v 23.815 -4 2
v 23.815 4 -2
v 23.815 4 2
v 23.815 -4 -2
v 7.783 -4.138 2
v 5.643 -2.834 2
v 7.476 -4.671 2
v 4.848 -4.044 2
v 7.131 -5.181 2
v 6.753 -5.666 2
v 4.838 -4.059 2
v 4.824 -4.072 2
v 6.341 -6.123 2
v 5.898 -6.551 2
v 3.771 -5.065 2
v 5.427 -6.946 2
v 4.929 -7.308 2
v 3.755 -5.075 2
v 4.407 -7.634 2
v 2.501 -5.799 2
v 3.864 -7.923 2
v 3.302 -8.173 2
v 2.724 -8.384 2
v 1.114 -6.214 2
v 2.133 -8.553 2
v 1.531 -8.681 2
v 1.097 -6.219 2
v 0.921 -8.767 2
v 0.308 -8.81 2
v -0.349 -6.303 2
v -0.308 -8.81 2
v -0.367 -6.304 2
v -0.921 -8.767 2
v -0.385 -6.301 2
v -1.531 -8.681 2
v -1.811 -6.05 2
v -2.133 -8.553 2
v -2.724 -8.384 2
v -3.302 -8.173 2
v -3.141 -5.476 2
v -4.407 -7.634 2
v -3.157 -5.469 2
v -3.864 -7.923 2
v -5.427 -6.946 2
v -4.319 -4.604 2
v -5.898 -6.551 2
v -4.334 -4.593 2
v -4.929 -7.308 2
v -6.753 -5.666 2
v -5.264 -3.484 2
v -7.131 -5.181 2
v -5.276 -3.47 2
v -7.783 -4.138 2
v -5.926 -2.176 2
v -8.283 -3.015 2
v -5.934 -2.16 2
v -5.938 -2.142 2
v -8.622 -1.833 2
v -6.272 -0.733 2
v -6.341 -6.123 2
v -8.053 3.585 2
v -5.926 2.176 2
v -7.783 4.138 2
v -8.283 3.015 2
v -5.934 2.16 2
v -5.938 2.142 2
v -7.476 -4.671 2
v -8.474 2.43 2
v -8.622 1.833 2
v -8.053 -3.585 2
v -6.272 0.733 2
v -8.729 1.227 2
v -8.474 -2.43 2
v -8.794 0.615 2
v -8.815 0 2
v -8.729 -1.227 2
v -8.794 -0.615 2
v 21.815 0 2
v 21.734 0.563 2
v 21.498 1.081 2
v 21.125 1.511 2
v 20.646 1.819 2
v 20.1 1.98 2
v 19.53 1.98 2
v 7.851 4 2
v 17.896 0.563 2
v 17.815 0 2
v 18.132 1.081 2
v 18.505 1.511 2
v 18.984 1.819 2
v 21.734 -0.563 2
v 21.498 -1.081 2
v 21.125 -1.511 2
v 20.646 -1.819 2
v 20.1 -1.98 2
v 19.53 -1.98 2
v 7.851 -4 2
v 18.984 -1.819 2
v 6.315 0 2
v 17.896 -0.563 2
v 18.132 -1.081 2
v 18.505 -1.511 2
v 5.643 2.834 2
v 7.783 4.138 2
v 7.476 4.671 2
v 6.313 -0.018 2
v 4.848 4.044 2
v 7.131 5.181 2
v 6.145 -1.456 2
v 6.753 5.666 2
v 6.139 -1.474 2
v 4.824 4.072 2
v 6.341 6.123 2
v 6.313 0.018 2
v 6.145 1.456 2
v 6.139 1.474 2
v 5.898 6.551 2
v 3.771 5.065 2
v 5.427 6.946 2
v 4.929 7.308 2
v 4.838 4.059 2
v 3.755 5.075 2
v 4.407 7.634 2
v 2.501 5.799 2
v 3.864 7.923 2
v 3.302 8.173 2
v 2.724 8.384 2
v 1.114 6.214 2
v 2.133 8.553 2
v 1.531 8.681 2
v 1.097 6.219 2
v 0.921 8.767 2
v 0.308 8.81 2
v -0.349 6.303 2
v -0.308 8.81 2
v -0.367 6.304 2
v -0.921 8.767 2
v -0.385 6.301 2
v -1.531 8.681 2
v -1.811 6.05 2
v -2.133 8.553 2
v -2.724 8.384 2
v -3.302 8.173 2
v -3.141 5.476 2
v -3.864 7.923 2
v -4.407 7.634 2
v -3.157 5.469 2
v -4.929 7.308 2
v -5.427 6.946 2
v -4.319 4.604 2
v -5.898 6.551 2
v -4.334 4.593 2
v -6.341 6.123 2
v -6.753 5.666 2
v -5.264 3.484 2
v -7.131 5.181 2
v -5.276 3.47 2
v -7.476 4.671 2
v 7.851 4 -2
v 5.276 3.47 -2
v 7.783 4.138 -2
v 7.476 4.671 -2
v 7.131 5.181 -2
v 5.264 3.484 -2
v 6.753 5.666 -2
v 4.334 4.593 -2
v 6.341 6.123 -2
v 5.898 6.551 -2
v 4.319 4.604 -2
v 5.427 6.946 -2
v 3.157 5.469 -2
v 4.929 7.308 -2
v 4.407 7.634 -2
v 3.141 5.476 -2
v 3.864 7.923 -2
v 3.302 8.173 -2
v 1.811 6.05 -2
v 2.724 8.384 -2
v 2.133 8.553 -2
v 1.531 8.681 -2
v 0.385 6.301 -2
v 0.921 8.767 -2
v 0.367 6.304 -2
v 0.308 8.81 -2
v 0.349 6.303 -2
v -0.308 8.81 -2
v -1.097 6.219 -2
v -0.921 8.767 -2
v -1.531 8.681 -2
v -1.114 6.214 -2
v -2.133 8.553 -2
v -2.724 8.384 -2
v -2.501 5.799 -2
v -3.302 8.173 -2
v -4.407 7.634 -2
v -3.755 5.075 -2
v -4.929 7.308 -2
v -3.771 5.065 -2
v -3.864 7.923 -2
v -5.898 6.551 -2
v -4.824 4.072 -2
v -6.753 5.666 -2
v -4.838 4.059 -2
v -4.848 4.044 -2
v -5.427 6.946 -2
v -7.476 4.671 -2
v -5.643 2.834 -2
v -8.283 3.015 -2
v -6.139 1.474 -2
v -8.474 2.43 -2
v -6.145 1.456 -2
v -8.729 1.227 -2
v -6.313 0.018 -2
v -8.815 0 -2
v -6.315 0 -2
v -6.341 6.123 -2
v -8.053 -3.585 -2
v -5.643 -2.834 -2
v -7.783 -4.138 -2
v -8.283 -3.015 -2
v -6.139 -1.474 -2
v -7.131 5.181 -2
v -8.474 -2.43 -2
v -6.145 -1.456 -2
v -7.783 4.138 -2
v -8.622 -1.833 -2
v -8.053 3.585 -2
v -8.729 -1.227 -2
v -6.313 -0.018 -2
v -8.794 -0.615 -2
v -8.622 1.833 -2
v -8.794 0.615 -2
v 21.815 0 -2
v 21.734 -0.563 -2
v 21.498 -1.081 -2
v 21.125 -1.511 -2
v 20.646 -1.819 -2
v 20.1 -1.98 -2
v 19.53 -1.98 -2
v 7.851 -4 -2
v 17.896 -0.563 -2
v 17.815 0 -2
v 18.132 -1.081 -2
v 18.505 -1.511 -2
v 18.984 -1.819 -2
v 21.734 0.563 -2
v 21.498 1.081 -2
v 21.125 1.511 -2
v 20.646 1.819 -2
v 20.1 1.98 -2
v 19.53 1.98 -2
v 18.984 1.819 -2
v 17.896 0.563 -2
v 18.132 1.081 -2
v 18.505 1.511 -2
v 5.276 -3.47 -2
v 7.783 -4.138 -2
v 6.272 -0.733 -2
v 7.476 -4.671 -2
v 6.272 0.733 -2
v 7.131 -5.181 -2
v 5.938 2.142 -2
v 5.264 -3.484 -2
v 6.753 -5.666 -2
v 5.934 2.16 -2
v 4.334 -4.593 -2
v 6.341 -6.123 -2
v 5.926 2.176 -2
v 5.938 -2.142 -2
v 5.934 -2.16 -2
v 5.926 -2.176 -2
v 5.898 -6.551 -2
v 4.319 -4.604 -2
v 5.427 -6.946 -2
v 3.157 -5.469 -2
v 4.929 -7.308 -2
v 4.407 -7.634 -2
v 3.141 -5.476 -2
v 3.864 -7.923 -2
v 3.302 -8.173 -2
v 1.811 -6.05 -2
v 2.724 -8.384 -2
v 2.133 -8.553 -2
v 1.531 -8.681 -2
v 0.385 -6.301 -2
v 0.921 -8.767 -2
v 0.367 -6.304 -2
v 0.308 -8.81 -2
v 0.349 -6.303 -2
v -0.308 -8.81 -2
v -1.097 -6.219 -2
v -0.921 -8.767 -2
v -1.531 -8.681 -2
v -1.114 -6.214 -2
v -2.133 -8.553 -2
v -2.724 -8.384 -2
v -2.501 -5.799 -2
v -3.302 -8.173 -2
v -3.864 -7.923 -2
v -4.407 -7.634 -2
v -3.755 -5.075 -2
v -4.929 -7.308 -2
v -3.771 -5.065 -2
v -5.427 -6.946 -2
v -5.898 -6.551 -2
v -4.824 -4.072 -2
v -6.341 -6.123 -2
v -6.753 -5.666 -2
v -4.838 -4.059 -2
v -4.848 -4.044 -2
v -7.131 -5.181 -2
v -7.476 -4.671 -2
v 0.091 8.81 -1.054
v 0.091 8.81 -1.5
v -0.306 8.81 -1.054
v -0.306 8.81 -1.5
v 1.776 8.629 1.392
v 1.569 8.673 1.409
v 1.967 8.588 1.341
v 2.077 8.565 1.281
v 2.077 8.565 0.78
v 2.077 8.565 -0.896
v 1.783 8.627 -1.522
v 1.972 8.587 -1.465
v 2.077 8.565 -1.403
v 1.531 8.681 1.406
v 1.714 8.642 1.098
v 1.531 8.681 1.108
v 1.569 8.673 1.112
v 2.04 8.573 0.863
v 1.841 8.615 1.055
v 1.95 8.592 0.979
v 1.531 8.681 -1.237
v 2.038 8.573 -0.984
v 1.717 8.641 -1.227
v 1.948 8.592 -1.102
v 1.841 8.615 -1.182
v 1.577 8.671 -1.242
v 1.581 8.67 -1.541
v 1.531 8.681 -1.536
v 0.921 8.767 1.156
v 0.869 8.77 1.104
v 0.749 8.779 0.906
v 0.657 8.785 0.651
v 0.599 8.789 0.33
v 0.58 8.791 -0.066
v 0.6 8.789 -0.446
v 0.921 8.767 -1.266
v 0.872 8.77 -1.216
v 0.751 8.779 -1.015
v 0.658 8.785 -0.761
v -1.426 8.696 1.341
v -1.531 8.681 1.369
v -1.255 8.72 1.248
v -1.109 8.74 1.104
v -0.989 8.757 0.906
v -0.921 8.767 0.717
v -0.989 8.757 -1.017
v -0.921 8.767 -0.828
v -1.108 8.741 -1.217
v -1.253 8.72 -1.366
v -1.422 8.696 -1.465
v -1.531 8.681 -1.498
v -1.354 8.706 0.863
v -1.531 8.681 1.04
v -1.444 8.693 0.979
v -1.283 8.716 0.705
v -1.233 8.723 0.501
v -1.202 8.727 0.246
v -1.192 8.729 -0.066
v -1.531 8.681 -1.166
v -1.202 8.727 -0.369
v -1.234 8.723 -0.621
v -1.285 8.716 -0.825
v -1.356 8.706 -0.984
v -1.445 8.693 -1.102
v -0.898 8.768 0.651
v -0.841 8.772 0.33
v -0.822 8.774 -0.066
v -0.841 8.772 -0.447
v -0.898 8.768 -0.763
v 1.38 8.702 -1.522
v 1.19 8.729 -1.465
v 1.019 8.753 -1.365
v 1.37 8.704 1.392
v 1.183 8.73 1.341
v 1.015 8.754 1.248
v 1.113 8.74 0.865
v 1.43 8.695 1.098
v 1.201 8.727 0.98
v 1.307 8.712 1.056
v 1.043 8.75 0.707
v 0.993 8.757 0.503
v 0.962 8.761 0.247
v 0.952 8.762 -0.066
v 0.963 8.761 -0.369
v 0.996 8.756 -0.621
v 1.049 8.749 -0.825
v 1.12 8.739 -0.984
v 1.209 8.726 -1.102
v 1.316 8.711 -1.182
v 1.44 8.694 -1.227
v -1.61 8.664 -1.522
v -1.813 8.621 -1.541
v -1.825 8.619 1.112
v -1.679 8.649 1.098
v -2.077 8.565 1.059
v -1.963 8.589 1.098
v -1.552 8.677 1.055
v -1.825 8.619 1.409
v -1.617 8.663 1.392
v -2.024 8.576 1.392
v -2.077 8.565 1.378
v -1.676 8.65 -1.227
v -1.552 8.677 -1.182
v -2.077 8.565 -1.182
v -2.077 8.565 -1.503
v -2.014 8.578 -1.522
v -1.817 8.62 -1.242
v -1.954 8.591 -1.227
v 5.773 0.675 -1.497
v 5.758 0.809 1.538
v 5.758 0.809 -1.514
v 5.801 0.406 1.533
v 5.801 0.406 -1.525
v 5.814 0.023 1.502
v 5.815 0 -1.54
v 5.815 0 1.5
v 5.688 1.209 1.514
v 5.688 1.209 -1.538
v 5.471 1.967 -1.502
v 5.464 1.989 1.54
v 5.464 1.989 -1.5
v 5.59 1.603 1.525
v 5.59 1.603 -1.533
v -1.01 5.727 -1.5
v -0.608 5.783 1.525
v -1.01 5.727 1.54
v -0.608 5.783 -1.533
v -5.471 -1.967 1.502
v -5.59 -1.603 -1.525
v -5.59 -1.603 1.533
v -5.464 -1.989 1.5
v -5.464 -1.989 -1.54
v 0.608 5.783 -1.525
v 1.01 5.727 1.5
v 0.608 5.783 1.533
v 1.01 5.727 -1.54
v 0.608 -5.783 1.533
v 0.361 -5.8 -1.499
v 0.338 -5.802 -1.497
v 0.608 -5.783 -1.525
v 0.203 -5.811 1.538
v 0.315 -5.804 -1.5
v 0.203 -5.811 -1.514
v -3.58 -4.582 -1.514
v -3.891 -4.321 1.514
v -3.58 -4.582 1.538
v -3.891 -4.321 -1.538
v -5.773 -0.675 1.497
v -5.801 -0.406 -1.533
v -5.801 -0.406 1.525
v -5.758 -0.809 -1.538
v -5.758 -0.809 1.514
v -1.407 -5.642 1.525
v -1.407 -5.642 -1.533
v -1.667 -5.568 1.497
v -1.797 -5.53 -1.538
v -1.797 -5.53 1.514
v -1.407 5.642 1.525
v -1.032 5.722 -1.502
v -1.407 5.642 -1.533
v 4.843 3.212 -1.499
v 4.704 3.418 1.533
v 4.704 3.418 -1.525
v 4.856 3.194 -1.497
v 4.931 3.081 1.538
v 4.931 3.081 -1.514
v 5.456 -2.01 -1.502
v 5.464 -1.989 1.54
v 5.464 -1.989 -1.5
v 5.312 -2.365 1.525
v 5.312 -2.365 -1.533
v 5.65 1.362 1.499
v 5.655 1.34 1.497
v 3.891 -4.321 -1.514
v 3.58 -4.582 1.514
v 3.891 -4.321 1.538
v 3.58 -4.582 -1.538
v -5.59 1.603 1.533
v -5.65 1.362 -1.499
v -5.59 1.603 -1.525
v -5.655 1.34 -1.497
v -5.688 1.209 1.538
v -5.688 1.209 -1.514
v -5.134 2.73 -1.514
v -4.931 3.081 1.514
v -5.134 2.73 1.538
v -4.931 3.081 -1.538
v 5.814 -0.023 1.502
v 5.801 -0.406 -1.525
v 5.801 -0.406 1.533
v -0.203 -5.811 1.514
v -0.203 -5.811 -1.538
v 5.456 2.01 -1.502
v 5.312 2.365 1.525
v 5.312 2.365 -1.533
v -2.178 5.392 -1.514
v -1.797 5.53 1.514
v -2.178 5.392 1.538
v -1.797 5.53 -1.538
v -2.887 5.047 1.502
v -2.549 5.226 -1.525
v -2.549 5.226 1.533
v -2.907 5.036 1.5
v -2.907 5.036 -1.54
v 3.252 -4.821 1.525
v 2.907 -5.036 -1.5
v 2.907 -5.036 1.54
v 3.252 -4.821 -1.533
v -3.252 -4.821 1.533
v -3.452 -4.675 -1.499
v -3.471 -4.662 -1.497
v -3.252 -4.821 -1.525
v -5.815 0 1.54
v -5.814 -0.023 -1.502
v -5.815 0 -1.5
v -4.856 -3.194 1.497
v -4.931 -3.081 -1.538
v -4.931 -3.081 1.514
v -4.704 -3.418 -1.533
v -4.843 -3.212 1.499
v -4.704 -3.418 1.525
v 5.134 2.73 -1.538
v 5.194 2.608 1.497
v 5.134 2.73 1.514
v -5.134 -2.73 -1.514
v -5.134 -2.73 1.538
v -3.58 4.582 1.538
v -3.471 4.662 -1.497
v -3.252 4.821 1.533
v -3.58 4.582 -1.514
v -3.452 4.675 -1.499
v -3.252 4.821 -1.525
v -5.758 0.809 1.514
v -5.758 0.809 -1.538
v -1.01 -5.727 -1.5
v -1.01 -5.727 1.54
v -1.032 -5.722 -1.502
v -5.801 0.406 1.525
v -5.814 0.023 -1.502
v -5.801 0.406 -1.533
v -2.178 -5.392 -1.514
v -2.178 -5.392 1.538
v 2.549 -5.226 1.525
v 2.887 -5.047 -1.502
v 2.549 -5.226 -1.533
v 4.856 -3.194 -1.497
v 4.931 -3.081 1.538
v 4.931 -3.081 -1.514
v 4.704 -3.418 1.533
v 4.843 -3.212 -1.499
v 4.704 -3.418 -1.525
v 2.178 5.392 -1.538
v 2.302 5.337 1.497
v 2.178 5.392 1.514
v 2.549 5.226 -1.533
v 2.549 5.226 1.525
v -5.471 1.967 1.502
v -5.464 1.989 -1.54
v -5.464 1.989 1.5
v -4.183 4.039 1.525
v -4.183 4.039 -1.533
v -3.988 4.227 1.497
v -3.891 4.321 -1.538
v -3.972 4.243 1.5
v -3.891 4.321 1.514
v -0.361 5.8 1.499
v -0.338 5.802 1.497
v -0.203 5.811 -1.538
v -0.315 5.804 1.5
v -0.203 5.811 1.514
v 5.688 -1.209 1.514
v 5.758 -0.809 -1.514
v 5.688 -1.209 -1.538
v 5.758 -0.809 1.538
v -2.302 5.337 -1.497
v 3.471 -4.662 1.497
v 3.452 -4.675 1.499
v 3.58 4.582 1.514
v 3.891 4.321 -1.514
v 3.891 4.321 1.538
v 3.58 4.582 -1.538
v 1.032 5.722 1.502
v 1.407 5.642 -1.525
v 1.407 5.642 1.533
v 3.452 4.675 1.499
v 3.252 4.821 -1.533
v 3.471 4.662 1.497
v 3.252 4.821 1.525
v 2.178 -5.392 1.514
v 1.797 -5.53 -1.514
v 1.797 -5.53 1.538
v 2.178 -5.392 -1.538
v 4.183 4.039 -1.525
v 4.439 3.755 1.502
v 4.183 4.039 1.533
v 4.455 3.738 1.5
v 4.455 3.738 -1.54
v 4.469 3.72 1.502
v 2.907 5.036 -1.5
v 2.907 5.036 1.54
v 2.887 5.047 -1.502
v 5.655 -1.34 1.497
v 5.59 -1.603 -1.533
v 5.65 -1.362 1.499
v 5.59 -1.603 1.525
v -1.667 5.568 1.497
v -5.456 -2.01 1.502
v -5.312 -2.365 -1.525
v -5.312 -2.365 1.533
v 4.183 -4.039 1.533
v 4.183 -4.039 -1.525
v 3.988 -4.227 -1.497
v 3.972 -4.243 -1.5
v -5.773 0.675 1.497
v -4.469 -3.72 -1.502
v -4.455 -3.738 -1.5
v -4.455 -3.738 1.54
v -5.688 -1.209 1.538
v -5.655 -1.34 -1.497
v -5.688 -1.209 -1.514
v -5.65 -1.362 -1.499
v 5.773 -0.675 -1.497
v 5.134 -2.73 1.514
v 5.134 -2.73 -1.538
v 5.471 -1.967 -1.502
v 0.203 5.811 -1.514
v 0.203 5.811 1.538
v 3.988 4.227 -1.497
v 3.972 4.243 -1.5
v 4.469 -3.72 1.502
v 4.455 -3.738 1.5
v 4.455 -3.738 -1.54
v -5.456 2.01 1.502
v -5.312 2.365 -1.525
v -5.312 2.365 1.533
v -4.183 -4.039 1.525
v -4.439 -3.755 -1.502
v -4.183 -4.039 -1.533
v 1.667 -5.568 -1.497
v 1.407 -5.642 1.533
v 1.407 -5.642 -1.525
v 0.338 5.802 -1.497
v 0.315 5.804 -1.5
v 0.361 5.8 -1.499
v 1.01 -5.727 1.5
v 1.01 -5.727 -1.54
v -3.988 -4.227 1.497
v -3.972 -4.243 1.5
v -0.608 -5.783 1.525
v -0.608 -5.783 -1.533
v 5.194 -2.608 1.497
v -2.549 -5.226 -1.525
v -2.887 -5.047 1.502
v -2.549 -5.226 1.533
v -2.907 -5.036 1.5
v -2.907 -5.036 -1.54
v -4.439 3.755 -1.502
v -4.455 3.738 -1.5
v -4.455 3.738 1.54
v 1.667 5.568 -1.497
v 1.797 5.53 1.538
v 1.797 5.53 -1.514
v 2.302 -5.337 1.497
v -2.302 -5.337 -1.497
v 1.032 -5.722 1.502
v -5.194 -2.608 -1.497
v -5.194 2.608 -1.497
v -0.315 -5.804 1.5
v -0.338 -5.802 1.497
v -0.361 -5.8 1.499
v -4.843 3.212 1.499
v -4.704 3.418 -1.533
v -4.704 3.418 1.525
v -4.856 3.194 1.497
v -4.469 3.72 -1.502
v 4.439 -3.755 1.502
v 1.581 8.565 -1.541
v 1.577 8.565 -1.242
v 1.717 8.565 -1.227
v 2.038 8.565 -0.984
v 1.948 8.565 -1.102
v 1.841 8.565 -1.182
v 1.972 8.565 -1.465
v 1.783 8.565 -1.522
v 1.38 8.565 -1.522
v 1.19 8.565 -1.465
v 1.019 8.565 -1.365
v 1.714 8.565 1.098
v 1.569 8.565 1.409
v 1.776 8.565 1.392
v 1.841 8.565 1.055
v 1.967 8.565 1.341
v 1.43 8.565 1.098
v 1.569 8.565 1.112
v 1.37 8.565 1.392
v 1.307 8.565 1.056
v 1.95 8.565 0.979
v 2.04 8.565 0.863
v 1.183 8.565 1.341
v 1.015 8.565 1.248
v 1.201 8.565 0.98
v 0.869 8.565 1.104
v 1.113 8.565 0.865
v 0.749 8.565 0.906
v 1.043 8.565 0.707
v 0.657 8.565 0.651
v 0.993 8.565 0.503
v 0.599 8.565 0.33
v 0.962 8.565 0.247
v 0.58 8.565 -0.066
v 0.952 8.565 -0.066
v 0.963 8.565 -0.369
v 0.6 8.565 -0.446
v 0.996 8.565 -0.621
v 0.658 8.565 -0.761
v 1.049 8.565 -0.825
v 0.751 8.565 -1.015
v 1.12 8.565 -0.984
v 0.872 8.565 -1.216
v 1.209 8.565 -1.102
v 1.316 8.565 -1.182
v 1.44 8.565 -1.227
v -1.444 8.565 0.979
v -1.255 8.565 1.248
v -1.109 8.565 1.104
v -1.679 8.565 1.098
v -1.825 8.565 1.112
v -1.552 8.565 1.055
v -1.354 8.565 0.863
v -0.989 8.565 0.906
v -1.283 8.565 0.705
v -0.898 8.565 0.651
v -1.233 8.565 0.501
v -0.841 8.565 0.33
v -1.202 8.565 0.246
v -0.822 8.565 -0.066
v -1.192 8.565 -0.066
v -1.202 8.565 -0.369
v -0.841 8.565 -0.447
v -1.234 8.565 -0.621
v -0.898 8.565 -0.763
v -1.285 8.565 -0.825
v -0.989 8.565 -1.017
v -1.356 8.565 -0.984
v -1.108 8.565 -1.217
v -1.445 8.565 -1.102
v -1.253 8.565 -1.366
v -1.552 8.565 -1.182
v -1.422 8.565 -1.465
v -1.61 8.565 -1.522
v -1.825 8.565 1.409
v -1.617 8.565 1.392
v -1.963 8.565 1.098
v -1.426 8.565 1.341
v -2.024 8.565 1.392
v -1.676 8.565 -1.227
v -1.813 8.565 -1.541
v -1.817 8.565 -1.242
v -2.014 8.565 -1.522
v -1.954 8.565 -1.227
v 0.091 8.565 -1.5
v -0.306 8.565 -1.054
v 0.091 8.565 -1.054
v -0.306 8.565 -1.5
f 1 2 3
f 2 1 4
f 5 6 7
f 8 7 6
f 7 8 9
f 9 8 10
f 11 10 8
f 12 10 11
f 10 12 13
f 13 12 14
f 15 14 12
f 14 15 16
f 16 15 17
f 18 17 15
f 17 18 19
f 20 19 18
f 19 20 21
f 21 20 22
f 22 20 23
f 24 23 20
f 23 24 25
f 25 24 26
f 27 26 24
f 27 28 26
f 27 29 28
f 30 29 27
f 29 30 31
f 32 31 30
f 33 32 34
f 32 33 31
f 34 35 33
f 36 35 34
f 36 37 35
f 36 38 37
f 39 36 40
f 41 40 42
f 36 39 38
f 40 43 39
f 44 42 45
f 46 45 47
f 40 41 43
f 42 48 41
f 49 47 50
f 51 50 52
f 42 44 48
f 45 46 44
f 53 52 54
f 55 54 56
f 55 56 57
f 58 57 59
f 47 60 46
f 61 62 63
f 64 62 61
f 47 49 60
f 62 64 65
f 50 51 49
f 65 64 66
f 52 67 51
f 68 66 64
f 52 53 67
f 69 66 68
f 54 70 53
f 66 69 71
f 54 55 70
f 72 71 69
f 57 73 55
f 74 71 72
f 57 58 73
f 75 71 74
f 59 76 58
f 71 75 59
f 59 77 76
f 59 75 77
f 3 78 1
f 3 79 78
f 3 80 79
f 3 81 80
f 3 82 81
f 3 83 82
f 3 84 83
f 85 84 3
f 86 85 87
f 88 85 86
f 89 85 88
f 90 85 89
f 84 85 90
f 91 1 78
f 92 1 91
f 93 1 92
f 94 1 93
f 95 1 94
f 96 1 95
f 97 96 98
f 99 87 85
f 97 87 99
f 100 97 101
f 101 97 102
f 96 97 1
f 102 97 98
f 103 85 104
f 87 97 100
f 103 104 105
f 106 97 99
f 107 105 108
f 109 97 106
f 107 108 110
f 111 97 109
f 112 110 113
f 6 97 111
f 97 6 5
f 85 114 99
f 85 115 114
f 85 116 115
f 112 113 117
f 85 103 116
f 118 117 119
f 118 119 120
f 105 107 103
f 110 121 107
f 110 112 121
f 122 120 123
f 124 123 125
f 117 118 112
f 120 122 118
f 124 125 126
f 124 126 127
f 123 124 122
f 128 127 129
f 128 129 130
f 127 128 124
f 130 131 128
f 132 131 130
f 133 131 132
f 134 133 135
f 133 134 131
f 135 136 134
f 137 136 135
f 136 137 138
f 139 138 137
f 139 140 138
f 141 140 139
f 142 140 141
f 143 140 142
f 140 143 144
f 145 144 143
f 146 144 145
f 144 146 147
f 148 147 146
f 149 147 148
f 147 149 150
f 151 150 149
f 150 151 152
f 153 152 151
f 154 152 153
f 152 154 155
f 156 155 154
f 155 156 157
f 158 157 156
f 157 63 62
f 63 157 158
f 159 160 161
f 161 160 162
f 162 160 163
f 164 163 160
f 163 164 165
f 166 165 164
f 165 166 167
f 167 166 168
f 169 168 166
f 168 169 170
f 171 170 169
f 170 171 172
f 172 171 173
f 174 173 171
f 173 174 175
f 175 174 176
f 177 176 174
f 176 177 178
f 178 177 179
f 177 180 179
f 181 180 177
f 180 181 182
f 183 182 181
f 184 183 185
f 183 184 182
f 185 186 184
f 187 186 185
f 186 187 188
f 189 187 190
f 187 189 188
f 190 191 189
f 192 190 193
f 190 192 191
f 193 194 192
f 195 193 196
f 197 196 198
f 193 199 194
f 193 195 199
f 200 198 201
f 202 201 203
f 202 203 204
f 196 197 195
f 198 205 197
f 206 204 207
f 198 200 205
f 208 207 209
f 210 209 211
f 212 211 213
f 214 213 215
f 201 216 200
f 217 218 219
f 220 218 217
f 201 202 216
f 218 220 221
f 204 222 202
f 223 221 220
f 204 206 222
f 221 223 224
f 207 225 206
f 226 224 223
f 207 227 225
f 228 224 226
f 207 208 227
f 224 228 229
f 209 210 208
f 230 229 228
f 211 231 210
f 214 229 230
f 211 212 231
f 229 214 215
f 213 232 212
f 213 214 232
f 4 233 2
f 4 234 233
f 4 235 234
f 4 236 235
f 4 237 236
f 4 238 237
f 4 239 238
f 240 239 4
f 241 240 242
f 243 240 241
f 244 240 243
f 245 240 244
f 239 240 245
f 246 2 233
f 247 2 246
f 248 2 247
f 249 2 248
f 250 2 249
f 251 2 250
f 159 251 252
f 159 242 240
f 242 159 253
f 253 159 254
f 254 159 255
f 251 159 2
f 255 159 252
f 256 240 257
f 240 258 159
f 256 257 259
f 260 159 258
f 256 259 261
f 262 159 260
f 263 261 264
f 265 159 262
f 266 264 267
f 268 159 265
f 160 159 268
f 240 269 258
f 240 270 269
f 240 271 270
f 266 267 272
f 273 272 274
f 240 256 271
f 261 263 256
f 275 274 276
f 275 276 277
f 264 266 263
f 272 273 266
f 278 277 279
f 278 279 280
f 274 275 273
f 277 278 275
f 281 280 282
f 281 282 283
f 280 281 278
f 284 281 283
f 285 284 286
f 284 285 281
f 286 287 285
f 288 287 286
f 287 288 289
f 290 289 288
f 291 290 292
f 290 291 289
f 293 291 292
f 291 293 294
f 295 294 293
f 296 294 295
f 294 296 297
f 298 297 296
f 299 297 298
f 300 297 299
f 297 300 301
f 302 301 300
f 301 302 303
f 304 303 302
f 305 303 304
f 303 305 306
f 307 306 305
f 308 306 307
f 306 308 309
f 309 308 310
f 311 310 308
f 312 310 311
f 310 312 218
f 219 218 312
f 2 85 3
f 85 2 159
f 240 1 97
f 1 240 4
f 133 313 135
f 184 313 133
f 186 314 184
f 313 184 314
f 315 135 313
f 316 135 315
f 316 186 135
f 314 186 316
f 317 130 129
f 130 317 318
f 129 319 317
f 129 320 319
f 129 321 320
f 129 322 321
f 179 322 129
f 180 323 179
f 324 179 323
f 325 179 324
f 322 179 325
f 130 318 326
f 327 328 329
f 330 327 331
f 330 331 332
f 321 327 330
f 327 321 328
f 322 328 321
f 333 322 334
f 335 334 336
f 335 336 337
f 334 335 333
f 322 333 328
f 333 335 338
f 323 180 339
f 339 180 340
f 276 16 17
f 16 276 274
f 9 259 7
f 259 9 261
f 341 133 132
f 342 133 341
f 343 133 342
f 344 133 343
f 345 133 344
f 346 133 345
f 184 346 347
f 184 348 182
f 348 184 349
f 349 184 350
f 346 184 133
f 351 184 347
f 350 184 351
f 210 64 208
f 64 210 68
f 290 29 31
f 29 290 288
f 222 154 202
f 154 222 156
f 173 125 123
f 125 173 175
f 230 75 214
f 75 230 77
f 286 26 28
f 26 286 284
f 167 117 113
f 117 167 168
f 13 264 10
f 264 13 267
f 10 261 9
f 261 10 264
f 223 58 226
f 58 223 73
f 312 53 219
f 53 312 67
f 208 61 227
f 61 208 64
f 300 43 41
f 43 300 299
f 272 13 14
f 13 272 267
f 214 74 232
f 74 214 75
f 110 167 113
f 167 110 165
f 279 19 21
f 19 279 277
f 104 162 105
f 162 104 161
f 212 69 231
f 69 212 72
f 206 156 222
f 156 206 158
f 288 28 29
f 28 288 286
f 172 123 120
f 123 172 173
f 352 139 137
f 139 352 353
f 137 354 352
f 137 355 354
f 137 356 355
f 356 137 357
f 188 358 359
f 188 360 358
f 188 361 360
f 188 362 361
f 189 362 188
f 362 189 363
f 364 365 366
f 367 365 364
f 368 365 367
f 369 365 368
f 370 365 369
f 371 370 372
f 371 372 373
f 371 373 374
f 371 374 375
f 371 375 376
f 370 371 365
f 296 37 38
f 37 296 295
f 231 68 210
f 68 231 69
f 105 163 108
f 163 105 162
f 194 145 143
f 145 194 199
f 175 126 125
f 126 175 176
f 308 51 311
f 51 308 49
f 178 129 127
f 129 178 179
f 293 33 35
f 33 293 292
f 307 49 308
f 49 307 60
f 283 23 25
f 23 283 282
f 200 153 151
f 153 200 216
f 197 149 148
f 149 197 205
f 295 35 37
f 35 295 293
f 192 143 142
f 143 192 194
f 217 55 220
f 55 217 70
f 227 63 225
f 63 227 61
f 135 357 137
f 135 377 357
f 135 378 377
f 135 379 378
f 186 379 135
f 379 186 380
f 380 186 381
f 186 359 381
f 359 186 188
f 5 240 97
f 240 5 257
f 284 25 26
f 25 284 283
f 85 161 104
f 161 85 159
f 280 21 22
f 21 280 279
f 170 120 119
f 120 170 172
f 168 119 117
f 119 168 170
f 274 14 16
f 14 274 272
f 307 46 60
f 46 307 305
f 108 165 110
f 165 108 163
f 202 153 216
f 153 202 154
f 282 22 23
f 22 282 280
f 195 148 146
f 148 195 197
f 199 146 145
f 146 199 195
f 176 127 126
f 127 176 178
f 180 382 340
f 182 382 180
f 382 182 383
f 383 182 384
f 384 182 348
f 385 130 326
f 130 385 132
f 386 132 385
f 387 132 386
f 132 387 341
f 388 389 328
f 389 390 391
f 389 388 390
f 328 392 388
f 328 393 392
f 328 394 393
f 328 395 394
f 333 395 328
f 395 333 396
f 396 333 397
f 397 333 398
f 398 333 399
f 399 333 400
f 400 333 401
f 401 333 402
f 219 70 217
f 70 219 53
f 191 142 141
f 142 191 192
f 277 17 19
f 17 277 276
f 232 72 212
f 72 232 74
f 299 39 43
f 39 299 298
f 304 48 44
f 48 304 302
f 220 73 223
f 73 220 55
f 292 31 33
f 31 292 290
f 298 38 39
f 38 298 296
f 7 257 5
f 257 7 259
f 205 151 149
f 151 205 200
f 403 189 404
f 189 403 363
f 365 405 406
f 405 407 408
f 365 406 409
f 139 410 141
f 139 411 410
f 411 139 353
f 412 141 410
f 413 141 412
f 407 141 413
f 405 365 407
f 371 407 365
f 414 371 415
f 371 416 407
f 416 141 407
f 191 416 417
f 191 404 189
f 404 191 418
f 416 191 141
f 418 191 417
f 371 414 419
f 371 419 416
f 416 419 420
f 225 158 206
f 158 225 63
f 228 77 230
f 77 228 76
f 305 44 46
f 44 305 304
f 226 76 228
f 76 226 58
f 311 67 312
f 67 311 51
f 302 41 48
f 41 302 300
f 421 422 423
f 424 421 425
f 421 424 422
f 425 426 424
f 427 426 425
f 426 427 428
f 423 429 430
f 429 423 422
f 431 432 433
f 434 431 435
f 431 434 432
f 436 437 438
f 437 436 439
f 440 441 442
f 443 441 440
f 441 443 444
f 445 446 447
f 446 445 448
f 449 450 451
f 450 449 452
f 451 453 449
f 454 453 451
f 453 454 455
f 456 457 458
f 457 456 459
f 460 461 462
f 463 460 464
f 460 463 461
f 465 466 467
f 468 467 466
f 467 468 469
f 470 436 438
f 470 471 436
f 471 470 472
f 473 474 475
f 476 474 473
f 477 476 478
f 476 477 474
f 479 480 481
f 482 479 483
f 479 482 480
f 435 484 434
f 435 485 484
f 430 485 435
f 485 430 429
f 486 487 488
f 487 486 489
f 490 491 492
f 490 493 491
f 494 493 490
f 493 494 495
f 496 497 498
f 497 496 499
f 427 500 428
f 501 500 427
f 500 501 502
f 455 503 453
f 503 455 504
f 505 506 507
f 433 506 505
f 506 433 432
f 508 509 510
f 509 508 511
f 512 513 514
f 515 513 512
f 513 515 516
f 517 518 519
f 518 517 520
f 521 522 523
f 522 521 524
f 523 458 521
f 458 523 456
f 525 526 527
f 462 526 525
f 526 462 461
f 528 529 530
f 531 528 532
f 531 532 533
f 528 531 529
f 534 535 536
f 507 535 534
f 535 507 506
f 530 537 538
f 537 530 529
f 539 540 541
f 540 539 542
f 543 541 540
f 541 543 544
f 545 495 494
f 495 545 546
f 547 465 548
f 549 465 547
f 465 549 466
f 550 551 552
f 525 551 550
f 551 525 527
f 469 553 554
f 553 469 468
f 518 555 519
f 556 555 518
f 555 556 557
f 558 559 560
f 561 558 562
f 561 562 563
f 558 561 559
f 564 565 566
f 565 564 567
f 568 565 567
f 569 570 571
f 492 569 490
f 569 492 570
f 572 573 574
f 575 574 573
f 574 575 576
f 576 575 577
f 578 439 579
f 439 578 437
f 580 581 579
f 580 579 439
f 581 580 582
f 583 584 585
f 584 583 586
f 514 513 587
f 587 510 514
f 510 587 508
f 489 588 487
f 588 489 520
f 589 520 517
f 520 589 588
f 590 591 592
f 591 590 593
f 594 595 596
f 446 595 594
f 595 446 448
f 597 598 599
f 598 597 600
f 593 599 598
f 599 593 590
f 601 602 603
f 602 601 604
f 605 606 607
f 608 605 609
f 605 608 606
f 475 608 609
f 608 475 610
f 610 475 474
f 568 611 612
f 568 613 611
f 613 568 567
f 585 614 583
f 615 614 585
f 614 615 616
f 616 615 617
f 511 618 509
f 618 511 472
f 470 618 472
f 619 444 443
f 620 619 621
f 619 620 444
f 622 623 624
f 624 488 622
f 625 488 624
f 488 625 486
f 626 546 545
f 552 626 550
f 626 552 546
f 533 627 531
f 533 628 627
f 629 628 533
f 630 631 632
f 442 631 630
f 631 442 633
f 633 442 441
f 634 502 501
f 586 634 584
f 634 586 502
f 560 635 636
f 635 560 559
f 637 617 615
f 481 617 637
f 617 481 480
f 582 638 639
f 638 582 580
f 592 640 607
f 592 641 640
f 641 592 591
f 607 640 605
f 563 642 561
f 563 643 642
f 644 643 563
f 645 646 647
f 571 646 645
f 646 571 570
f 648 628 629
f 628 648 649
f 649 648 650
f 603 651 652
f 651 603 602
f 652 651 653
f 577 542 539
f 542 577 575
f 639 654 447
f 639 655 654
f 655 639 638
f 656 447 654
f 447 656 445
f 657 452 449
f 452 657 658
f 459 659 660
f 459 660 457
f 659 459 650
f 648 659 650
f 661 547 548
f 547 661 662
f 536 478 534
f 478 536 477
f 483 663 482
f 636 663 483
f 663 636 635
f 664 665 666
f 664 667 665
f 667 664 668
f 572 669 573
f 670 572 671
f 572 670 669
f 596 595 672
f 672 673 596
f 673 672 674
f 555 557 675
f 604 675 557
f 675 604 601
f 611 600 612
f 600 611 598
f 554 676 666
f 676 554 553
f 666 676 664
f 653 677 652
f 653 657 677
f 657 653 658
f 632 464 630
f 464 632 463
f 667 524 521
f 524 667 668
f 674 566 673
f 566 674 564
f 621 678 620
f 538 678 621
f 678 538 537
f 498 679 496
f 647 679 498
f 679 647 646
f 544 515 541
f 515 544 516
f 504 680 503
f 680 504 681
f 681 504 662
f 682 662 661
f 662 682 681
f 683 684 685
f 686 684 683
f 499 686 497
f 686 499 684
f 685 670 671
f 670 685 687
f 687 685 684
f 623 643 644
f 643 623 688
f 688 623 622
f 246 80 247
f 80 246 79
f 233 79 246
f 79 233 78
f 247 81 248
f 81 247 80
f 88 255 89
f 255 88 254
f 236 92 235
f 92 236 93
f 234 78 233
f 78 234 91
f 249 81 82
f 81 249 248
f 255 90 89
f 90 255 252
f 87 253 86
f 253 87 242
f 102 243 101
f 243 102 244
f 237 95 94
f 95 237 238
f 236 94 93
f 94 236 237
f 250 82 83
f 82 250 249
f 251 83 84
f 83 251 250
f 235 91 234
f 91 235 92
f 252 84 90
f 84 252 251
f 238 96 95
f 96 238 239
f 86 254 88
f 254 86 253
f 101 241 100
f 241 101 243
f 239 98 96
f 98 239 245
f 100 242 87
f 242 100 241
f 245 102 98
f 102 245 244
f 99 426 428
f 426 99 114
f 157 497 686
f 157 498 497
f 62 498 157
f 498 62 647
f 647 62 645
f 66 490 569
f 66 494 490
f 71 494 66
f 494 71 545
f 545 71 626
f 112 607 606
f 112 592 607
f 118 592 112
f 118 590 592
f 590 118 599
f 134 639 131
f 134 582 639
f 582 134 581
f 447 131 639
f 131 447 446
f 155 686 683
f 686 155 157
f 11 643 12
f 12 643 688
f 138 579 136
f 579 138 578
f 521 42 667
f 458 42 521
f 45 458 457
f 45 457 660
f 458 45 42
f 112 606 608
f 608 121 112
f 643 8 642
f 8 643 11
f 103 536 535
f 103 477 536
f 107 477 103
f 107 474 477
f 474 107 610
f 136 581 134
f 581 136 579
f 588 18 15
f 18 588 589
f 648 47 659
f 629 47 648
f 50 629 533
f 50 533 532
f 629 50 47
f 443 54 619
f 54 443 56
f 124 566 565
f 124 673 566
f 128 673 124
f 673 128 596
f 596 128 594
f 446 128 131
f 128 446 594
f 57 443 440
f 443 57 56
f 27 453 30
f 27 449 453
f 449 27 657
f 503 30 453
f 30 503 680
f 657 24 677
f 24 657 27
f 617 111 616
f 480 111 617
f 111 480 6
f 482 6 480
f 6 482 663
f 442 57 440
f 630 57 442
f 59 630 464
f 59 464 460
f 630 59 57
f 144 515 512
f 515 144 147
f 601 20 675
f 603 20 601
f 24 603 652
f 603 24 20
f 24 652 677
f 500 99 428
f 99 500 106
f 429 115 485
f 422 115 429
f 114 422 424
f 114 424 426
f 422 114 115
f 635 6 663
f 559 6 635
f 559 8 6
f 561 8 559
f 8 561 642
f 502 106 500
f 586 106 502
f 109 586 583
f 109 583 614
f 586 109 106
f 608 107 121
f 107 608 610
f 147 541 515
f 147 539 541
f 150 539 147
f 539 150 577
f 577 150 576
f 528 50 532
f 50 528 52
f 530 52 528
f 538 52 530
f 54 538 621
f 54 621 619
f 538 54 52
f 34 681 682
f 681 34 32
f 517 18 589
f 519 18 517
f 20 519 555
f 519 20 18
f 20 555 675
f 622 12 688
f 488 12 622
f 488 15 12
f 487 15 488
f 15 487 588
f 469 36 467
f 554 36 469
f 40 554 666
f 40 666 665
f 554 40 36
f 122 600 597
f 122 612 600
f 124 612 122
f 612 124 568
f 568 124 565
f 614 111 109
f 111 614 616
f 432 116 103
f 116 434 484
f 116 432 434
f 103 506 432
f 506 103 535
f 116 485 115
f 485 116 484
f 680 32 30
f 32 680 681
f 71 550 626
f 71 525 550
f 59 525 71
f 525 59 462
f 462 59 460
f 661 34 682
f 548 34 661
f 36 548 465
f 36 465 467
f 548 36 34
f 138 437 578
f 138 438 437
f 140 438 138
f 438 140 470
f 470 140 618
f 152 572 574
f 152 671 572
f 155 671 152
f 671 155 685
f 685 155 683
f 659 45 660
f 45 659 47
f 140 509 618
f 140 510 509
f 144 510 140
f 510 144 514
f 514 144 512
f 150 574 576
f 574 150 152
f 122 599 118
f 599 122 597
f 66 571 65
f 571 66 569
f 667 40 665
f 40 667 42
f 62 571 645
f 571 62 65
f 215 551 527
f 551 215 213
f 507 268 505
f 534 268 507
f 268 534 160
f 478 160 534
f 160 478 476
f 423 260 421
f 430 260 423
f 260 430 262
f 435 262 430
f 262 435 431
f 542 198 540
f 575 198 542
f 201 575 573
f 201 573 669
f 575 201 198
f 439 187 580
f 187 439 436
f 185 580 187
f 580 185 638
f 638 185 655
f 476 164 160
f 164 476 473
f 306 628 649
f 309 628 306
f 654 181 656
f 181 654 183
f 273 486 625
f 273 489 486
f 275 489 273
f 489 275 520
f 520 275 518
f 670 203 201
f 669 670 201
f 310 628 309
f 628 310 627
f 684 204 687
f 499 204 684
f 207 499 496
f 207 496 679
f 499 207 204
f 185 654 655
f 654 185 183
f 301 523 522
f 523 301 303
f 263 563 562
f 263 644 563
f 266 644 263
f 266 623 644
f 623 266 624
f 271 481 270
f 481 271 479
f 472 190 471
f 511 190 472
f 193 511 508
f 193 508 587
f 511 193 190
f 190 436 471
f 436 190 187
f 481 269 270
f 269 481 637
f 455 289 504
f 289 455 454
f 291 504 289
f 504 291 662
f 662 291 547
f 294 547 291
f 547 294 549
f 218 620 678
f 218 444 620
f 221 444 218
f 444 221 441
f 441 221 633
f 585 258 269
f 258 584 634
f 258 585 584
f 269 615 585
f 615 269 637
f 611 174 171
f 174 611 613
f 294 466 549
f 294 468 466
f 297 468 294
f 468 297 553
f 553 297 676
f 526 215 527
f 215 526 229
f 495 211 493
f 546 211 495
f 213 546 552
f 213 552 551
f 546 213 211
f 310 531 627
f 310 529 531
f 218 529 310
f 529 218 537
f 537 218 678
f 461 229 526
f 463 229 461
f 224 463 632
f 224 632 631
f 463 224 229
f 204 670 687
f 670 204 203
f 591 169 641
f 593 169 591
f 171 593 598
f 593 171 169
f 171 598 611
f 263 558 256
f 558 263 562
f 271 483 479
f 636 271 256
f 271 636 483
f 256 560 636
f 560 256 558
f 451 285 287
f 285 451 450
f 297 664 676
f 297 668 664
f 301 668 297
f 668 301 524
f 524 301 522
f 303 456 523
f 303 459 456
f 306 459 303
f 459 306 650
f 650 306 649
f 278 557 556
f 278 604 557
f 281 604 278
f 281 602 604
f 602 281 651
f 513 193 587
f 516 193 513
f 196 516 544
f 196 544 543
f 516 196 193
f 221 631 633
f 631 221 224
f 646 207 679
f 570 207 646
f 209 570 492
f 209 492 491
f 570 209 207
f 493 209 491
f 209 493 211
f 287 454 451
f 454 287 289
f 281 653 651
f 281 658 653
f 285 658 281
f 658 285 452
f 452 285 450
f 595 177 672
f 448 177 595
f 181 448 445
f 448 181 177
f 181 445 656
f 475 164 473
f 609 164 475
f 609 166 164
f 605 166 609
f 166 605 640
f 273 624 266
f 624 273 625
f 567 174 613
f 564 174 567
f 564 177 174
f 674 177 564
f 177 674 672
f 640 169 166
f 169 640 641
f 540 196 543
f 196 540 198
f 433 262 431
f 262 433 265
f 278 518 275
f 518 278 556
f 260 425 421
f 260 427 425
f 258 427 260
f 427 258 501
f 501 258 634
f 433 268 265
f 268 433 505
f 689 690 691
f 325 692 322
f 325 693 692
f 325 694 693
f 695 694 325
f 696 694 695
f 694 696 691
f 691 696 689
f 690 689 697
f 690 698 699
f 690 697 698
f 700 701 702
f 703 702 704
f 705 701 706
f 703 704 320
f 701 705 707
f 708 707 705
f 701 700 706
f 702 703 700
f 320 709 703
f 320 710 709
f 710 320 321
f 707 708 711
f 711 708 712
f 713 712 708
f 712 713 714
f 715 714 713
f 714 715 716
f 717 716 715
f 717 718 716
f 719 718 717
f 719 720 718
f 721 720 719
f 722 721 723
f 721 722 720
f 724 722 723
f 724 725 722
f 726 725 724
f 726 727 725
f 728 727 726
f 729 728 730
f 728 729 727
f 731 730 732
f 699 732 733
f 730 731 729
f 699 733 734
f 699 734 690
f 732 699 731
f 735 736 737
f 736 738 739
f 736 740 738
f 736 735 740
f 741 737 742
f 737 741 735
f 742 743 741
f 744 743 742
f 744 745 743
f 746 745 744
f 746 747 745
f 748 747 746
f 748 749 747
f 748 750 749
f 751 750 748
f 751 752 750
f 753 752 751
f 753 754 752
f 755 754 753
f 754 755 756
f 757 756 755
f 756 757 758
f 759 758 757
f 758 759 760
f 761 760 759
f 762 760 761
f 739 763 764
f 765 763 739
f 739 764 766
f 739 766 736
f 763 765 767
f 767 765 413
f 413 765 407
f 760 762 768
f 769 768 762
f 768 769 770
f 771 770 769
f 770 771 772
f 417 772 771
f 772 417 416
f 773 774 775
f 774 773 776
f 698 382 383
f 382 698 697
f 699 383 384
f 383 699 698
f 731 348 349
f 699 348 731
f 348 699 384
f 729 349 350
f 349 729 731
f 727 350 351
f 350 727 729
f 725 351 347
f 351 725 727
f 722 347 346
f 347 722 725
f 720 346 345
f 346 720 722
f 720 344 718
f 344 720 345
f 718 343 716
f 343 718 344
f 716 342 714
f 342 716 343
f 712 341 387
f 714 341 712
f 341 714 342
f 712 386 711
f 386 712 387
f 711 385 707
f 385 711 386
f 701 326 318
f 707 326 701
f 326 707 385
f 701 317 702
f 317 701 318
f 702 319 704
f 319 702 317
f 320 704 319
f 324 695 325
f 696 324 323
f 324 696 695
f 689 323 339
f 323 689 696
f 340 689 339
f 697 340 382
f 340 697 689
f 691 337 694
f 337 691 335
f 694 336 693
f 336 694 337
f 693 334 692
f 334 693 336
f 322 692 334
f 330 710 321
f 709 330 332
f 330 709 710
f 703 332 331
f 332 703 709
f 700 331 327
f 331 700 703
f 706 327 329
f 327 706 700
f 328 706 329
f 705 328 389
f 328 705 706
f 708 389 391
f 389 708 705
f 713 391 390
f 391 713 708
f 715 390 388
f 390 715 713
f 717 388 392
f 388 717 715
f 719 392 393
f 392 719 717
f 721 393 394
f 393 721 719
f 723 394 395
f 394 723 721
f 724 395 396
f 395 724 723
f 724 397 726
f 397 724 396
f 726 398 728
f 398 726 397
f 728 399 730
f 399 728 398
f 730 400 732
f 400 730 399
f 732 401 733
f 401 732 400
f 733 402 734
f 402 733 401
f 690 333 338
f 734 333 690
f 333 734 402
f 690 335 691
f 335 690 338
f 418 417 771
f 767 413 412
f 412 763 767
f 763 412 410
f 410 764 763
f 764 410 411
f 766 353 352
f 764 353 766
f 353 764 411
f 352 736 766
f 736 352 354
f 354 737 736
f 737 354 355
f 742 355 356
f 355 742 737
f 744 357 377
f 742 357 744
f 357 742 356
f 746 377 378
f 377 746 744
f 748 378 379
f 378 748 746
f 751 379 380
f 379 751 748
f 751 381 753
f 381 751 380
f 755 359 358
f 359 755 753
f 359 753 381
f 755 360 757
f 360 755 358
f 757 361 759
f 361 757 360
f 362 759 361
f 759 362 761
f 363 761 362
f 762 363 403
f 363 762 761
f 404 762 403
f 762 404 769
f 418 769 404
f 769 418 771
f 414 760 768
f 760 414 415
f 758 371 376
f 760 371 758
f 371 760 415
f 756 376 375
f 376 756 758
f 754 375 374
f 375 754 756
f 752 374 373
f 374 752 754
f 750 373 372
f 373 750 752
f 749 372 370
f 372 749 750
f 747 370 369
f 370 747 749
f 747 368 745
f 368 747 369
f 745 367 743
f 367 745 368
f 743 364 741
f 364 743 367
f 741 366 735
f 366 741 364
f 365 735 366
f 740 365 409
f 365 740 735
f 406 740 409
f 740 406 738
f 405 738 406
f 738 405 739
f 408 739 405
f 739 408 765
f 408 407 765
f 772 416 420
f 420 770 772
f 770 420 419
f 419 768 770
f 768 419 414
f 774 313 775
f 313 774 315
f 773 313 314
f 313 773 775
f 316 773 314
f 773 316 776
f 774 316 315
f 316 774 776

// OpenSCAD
ringSize=0; // [0:0.25:16]

module ring(message,outerDiameter,innerDiameter,height)
{
    letterHeight=0.5;
    
    // major ring and triangle corner
	module shapeA() {
		difference() {
            union() {
                // corner
                translate([outerDiameter+7,0,0])
                    cube([16,8,height],true,$fn=90);
                // outer ring
                cylinder(height,outerDiameter,outerDiameter,true,$fn=90);
            }
            // interior hole
            cylinder(height*2,innerDiameter,innerDiameter,true,$fn=90);
            // tiny hole for management
			translate([outerDiameter+11,0,0])
				cylinder(height*2,2,2,true,$fn=45/2);
		}
	}

    // rounded corner near the small hole
	module roundedCorner() {
		difference() {
			translate([outerDiameter,outerDiameter,0])
				cube([8,8,height*2],true);
			translate([outerDiameter-4,outerDiameter-4,0])
				cylinder(height*2,4,4,true,$fn=90);
		}		
	}

    // text on the side
    module letters() {
        translate([outerDiameter-14,outerDiameter-letterHeight/2,-(height-1)/2])
        rotate([90,0,180])
            linear_extrude(letterHeight)
                text(message,
                    font="Liberation Sans",
                    size=height-1,
                    halign="right");
    }

    // fillets on interior curve
    module fillets() {
        color([1,0,0])
            cylinder(height*2,innerDiameter-height-1.5,innerDiameter+height-1.5,true);
        color([1,0,0])
            rotate([0,180,0])
                cylinder(height*2,innerDiameter-height-1.5,innerDiameter+height-1.5,true);
    }
    
    // put the various pieces together
	module finalAssembly() {
        difference() {
            shapeA();
            letters();
            fillets();
        }
	}
	
    // do it!
    finalAssembly();
}

module ringMaker(ringSize) {
	function stod(s)= 0.8128 * s + 11.63;

    d = stod(ringSize)/2;
    if((ringSize%1)==0) {
        label = str(ringSize,".00");
        ring(label,d+3,d,4);
    } else {
        label = str(ringSize);
        ring(label,d+3,d,4);
    }
}

ringMaker(ringSize);
